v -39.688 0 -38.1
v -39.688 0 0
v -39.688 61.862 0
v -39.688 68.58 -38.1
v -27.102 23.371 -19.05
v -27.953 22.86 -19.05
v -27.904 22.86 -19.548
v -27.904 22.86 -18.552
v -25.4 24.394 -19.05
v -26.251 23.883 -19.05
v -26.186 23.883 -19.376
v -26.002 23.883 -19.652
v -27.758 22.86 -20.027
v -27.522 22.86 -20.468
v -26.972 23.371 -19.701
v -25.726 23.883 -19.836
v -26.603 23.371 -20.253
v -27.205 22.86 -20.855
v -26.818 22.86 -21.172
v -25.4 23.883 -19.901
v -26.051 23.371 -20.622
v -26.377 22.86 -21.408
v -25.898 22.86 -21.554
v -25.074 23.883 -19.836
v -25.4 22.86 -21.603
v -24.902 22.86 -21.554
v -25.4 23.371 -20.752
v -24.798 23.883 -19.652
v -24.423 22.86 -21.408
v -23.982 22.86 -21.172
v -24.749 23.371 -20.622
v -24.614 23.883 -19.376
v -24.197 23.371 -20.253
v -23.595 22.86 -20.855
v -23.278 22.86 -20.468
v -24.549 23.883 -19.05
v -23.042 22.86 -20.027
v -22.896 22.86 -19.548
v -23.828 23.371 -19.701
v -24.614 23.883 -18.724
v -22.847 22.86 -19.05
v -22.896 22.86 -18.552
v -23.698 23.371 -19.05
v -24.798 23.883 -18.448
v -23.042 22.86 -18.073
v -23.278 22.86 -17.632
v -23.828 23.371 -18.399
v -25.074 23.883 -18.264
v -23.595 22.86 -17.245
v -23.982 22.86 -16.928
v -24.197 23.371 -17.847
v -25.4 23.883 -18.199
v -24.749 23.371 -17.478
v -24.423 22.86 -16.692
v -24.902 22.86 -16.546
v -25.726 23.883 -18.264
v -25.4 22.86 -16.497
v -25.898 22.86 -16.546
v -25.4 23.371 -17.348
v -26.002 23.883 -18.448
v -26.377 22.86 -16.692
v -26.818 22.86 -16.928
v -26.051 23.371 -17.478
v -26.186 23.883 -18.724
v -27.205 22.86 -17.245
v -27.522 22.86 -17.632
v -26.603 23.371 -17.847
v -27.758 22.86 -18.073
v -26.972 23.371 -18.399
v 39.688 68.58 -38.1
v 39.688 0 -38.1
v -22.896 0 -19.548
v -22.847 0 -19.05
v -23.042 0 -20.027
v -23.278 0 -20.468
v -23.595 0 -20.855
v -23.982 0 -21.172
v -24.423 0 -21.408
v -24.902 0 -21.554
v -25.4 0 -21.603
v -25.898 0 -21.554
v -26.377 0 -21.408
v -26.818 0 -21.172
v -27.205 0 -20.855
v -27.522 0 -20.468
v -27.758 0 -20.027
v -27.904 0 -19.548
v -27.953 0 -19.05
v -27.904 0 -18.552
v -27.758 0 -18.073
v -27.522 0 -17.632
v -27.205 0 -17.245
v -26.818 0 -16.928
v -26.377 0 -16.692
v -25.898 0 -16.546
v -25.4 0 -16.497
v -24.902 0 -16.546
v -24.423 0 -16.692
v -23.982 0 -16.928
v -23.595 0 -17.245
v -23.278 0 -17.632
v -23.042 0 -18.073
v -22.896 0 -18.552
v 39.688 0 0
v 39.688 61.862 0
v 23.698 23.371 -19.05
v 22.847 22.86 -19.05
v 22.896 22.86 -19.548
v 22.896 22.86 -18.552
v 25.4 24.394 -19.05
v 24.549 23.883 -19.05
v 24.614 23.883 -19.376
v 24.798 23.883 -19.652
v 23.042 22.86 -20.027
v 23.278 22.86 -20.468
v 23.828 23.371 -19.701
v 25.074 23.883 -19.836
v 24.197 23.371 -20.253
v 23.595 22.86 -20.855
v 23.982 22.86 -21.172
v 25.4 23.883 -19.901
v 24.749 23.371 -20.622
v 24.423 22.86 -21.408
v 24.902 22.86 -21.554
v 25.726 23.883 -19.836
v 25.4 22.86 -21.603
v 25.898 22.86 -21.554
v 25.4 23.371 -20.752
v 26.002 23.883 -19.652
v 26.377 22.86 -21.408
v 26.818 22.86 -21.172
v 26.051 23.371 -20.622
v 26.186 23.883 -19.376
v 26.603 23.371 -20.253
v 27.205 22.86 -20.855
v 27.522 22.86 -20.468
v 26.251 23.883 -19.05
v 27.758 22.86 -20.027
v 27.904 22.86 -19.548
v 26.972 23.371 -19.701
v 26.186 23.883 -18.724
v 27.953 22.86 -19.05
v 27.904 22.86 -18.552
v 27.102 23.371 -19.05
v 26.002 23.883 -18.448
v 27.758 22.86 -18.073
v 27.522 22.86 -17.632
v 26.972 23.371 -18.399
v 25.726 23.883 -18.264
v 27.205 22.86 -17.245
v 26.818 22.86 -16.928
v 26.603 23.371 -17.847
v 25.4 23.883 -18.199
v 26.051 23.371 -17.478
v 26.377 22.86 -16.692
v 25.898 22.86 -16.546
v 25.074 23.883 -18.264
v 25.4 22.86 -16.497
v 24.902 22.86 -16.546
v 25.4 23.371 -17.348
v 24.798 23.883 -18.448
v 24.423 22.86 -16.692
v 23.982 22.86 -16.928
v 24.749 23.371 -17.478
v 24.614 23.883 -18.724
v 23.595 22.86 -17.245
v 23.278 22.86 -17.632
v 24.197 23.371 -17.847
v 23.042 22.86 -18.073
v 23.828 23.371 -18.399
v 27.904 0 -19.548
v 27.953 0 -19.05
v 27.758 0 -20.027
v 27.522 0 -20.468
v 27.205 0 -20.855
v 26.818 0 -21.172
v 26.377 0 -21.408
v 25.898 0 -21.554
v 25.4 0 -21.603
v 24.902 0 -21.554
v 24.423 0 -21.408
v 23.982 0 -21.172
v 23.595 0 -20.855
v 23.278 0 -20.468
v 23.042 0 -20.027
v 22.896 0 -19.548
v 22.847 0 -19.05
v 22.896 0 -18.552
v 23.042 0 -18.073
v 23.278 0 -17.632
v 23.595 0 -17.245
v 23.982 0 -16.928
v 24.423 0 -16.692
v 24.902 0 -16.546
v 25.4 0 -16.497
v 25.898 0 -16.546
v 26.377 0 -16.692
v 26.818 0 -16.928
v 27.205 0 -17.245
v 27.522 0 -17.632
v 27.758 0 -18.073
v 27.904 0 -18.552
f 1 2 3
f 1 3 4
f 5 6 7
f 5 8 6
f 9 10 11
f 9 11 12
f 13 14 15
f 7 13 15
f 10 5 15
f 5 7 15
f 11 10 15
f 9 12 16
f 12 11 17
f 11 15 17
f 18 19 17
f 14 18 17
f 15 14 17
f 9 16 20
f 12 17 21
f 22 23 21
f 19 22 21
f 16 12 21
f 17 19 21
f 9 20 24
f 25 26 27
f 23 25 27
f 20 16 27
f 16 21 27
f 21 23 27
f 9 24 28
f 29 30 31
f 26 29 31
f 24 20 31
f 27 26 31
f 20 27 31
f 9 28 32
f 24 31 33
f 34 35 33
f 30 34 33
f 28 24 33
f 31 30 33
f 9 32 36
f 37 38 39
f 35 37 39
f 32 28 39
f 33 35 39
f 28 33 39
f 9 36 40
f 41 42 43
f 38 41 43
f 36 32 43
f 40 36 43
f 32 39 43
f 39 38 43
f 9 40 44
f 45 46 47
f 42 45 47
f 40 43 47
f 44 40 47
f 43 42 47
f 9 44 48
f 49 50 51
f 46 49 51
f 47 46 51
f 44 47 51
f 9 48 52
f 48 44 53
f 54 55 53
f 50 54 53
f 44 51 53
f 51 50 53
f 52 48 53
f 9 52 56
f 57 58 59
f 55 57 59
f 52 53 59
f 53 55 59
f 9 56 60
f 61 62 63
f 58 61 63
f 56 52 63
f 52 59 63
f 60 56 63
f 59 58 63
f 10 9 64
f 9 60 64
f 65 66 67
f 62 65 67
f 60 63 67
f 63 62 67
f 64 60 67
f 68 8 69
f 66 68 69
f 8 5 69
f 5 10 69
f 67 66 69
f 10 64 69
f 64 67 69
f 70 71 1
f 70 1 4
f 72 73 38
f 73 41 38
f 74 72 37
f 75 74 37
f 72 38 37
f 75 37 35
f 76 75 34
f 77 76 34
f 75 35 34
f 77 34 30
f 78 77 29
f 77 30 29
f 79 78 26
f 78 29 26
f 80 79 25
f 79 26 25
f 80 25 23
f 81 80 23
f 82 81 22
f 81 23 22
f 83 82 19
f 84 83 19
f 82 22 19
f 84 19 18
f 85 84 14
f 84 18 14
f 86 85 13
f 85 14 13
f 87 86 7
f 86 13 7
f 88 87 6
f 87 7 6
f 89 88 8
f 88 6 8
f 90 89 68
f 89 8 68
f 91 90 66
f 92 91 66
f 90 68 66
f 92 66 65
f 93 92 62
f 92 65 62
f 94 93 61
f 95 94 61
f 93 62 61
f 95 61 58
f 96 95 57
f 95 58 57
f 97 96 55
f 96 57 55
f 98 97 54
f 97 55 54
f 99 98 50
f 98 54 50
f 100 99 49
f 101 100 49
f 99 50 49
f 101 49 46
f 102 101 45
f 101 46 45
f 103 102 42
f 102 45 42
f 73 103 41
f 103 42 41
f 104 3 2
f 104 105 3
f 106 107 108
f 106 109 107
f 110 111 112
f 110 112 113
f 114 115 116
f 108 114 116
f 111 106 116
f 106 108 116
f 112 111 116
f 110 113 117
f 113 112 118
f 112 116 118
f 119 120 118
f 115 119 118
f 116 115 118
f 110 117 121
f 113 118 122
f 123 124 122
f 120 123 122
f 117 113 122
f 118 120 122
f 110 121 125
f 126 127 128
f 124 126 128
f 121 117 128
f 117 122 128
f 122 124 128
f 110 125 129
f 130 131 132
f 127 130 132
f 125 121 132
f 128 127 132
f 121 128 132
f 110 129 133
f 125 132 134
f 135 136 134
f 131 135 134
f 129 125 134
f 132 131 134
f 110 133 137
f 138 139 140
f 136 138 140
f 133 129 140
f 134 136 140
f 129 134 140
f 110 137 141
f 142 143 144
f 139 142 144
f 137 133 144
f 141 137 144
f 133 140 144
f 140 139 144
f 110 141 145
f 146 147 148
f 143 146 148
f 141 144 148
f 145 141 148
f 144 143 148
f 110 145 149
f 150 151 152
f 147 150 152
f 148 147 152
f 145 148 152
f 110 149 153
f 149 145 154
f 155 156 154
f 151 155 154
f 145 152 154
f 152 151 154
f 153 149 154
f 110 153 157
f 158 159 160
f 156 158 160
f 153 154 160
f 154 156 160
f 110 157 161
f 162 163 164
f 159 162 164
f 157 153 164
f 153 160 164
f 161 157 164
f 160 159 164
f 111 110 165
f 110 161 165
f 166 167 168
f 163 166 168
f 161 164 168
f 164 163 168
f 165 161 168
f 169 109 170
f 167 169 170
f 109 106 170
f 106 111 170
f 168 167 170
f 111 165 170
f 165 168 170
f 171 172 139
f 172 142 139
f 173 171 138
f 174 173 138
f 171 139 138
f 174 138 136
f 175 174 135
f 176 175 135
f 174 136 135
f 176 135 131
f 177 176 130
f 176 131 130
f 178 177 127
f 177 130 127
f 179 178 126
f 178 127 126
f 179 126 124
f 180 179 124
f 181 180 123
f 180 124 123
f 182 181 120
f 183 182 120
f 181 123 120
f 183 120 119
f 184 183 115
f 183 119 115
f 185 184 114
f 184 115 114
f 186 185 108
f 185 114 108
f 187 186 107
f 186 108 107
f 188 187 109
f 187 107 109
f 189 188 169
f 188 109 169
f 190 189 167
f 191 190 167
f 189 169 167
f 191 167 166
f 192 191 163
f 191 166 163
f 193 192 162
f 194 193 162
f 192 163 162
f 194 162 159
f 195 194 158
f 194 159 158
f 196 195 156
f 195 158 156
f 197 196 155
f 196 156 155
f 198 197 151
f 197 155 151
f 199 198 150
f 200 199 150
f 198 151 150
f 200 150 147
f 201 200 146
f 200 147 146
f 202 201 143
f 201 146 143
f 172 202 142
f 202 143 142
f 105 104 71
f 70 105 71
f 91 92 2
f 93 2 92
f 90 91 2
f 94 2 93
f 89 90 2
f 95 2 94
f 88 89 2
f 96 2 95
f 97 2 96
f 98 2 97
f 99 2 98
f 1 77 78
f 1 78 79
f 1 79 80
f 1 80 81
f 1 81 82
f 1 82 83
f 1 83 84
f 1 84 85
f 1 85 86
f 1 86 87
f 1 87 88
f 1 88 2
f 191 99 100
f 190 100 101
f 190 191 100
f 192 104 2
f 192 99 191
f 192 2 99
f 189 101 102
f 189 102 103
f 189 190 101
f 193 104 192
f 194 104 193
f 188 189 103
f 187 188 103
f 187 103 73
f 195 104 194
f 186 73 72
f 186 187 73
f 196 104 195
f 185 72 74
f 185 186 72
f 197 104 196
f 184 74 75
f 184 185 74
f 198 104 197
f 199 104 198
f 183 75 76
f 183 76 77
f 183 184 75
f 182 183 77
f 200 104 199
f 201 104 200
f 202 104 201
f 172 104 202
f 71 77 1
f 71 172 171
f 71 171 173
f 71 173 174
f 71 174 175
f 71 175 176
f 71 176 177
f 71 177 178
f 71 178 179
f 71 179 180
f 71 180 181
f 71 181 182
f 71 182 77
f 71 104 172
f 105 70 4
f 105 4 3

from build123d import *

# Parameters (mm, degrees)
BOSS_EXTRUDE2_DEPTH         = 39.6875
F_1_4_20_TAPPED_HOLE1_D     = 5.1054
F_1_4_20_TAPPED_HOLE1_DEPTH = 22.86
F_1_4_20_TAPPED_HOLE1_TIP   = 1.533816902


with BuildPart() as part:
    # Sketch3 → Boss-Extrude2 (new body, symmetric)
    with BuildSketch(Plane(origin=(0, 0, 0), x_dir=(0, 0, -1), z_dir=(1, 0, 0))):
        Polygon((0, 0), (38.1, 0), (38.1, 68.58), (0, 61.861942035), align=None)
    extrude(amount=BOSS_EXTRUDE2_DEPTH, both=True)

    # 1/4-20 Tapped Hole1
    with Locations(Plane(origin=(0, 0, 0), x_dir=(-1, 0, 0), z_dir=(0, -1, 0))):
        with Locations((25.4, 19.05), (-25.4, 19.05)):
            Hole(F_1_4_20_TAPPED_HOLE1_D / 2, depth=F_1_4_20_TAPPED_HOLE1_DEPTH)
            with Locations((0, 0, -(F_1_4_20_TAPPED_HOLE1_DEPTH + F_1_4_20_TAPPED_HOLE1_TIP / 2))):  # 118° drill point
                Cone(0, F_1_4_20_TAPPED_HOLE1_D / 2, F_1_4_20_TAPPED_HOLE1_TIP, mode=Mode.SUBTRACT)


solid = part.part
